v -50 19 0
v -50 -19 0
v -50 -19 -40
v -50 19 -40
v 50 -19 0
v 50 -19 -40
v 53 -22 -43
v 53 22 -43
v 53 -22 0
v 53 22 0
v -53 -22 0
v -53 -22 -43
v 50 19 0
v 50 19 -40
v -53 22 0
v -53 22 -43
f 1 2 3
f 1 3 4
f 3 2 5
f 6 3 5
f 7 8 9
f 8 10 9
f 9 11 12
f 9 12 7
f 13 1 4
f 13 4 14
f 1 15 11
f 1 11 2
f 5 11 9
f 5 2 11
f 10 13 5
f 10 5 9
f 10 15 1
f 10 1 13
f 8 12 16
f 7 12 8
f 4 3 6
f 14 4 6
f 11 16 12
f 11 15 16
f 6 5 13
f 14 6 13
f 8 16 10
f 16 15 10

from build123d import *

# Parameters (mm, degrees)
F1_W     = 106
F1_H     = 44
F1_W_2   = 100
F1_H_2   = 38
F2_DEPTH = 40
F3_W     = 106
F3_H     = 44
F3_W_2   = 100
F3_H_2   = 38
F4_DEPTH = 3


with BuildPart() as f2:
    # F1 (on Top) → F2 (new body)
    with BuildSketch(Plane.XY):
        Rectangle(F1_W, F1_H)
        Rectangle(F1_W_2, F1_H_2, mode=Mode.SUBTRACT)
    extrude(amount=-F2_DEPTH)

    # F3 (on face) → F4 (join)
    with BuildSketch(Plane(origin=(0, 0, -40), x_dir=(1, 0, 0), z_dir=(0, 0, -1))):
        Rectangle(F3_W, F3_H)
        Rectangle(F3_W_2, F3_H_2, mode=Mode.SUBTRACT)
        Rectangle(F3_W_2, F3_H_2)
    extrude(amount=F4_DEPTH)


solid = f2.part
